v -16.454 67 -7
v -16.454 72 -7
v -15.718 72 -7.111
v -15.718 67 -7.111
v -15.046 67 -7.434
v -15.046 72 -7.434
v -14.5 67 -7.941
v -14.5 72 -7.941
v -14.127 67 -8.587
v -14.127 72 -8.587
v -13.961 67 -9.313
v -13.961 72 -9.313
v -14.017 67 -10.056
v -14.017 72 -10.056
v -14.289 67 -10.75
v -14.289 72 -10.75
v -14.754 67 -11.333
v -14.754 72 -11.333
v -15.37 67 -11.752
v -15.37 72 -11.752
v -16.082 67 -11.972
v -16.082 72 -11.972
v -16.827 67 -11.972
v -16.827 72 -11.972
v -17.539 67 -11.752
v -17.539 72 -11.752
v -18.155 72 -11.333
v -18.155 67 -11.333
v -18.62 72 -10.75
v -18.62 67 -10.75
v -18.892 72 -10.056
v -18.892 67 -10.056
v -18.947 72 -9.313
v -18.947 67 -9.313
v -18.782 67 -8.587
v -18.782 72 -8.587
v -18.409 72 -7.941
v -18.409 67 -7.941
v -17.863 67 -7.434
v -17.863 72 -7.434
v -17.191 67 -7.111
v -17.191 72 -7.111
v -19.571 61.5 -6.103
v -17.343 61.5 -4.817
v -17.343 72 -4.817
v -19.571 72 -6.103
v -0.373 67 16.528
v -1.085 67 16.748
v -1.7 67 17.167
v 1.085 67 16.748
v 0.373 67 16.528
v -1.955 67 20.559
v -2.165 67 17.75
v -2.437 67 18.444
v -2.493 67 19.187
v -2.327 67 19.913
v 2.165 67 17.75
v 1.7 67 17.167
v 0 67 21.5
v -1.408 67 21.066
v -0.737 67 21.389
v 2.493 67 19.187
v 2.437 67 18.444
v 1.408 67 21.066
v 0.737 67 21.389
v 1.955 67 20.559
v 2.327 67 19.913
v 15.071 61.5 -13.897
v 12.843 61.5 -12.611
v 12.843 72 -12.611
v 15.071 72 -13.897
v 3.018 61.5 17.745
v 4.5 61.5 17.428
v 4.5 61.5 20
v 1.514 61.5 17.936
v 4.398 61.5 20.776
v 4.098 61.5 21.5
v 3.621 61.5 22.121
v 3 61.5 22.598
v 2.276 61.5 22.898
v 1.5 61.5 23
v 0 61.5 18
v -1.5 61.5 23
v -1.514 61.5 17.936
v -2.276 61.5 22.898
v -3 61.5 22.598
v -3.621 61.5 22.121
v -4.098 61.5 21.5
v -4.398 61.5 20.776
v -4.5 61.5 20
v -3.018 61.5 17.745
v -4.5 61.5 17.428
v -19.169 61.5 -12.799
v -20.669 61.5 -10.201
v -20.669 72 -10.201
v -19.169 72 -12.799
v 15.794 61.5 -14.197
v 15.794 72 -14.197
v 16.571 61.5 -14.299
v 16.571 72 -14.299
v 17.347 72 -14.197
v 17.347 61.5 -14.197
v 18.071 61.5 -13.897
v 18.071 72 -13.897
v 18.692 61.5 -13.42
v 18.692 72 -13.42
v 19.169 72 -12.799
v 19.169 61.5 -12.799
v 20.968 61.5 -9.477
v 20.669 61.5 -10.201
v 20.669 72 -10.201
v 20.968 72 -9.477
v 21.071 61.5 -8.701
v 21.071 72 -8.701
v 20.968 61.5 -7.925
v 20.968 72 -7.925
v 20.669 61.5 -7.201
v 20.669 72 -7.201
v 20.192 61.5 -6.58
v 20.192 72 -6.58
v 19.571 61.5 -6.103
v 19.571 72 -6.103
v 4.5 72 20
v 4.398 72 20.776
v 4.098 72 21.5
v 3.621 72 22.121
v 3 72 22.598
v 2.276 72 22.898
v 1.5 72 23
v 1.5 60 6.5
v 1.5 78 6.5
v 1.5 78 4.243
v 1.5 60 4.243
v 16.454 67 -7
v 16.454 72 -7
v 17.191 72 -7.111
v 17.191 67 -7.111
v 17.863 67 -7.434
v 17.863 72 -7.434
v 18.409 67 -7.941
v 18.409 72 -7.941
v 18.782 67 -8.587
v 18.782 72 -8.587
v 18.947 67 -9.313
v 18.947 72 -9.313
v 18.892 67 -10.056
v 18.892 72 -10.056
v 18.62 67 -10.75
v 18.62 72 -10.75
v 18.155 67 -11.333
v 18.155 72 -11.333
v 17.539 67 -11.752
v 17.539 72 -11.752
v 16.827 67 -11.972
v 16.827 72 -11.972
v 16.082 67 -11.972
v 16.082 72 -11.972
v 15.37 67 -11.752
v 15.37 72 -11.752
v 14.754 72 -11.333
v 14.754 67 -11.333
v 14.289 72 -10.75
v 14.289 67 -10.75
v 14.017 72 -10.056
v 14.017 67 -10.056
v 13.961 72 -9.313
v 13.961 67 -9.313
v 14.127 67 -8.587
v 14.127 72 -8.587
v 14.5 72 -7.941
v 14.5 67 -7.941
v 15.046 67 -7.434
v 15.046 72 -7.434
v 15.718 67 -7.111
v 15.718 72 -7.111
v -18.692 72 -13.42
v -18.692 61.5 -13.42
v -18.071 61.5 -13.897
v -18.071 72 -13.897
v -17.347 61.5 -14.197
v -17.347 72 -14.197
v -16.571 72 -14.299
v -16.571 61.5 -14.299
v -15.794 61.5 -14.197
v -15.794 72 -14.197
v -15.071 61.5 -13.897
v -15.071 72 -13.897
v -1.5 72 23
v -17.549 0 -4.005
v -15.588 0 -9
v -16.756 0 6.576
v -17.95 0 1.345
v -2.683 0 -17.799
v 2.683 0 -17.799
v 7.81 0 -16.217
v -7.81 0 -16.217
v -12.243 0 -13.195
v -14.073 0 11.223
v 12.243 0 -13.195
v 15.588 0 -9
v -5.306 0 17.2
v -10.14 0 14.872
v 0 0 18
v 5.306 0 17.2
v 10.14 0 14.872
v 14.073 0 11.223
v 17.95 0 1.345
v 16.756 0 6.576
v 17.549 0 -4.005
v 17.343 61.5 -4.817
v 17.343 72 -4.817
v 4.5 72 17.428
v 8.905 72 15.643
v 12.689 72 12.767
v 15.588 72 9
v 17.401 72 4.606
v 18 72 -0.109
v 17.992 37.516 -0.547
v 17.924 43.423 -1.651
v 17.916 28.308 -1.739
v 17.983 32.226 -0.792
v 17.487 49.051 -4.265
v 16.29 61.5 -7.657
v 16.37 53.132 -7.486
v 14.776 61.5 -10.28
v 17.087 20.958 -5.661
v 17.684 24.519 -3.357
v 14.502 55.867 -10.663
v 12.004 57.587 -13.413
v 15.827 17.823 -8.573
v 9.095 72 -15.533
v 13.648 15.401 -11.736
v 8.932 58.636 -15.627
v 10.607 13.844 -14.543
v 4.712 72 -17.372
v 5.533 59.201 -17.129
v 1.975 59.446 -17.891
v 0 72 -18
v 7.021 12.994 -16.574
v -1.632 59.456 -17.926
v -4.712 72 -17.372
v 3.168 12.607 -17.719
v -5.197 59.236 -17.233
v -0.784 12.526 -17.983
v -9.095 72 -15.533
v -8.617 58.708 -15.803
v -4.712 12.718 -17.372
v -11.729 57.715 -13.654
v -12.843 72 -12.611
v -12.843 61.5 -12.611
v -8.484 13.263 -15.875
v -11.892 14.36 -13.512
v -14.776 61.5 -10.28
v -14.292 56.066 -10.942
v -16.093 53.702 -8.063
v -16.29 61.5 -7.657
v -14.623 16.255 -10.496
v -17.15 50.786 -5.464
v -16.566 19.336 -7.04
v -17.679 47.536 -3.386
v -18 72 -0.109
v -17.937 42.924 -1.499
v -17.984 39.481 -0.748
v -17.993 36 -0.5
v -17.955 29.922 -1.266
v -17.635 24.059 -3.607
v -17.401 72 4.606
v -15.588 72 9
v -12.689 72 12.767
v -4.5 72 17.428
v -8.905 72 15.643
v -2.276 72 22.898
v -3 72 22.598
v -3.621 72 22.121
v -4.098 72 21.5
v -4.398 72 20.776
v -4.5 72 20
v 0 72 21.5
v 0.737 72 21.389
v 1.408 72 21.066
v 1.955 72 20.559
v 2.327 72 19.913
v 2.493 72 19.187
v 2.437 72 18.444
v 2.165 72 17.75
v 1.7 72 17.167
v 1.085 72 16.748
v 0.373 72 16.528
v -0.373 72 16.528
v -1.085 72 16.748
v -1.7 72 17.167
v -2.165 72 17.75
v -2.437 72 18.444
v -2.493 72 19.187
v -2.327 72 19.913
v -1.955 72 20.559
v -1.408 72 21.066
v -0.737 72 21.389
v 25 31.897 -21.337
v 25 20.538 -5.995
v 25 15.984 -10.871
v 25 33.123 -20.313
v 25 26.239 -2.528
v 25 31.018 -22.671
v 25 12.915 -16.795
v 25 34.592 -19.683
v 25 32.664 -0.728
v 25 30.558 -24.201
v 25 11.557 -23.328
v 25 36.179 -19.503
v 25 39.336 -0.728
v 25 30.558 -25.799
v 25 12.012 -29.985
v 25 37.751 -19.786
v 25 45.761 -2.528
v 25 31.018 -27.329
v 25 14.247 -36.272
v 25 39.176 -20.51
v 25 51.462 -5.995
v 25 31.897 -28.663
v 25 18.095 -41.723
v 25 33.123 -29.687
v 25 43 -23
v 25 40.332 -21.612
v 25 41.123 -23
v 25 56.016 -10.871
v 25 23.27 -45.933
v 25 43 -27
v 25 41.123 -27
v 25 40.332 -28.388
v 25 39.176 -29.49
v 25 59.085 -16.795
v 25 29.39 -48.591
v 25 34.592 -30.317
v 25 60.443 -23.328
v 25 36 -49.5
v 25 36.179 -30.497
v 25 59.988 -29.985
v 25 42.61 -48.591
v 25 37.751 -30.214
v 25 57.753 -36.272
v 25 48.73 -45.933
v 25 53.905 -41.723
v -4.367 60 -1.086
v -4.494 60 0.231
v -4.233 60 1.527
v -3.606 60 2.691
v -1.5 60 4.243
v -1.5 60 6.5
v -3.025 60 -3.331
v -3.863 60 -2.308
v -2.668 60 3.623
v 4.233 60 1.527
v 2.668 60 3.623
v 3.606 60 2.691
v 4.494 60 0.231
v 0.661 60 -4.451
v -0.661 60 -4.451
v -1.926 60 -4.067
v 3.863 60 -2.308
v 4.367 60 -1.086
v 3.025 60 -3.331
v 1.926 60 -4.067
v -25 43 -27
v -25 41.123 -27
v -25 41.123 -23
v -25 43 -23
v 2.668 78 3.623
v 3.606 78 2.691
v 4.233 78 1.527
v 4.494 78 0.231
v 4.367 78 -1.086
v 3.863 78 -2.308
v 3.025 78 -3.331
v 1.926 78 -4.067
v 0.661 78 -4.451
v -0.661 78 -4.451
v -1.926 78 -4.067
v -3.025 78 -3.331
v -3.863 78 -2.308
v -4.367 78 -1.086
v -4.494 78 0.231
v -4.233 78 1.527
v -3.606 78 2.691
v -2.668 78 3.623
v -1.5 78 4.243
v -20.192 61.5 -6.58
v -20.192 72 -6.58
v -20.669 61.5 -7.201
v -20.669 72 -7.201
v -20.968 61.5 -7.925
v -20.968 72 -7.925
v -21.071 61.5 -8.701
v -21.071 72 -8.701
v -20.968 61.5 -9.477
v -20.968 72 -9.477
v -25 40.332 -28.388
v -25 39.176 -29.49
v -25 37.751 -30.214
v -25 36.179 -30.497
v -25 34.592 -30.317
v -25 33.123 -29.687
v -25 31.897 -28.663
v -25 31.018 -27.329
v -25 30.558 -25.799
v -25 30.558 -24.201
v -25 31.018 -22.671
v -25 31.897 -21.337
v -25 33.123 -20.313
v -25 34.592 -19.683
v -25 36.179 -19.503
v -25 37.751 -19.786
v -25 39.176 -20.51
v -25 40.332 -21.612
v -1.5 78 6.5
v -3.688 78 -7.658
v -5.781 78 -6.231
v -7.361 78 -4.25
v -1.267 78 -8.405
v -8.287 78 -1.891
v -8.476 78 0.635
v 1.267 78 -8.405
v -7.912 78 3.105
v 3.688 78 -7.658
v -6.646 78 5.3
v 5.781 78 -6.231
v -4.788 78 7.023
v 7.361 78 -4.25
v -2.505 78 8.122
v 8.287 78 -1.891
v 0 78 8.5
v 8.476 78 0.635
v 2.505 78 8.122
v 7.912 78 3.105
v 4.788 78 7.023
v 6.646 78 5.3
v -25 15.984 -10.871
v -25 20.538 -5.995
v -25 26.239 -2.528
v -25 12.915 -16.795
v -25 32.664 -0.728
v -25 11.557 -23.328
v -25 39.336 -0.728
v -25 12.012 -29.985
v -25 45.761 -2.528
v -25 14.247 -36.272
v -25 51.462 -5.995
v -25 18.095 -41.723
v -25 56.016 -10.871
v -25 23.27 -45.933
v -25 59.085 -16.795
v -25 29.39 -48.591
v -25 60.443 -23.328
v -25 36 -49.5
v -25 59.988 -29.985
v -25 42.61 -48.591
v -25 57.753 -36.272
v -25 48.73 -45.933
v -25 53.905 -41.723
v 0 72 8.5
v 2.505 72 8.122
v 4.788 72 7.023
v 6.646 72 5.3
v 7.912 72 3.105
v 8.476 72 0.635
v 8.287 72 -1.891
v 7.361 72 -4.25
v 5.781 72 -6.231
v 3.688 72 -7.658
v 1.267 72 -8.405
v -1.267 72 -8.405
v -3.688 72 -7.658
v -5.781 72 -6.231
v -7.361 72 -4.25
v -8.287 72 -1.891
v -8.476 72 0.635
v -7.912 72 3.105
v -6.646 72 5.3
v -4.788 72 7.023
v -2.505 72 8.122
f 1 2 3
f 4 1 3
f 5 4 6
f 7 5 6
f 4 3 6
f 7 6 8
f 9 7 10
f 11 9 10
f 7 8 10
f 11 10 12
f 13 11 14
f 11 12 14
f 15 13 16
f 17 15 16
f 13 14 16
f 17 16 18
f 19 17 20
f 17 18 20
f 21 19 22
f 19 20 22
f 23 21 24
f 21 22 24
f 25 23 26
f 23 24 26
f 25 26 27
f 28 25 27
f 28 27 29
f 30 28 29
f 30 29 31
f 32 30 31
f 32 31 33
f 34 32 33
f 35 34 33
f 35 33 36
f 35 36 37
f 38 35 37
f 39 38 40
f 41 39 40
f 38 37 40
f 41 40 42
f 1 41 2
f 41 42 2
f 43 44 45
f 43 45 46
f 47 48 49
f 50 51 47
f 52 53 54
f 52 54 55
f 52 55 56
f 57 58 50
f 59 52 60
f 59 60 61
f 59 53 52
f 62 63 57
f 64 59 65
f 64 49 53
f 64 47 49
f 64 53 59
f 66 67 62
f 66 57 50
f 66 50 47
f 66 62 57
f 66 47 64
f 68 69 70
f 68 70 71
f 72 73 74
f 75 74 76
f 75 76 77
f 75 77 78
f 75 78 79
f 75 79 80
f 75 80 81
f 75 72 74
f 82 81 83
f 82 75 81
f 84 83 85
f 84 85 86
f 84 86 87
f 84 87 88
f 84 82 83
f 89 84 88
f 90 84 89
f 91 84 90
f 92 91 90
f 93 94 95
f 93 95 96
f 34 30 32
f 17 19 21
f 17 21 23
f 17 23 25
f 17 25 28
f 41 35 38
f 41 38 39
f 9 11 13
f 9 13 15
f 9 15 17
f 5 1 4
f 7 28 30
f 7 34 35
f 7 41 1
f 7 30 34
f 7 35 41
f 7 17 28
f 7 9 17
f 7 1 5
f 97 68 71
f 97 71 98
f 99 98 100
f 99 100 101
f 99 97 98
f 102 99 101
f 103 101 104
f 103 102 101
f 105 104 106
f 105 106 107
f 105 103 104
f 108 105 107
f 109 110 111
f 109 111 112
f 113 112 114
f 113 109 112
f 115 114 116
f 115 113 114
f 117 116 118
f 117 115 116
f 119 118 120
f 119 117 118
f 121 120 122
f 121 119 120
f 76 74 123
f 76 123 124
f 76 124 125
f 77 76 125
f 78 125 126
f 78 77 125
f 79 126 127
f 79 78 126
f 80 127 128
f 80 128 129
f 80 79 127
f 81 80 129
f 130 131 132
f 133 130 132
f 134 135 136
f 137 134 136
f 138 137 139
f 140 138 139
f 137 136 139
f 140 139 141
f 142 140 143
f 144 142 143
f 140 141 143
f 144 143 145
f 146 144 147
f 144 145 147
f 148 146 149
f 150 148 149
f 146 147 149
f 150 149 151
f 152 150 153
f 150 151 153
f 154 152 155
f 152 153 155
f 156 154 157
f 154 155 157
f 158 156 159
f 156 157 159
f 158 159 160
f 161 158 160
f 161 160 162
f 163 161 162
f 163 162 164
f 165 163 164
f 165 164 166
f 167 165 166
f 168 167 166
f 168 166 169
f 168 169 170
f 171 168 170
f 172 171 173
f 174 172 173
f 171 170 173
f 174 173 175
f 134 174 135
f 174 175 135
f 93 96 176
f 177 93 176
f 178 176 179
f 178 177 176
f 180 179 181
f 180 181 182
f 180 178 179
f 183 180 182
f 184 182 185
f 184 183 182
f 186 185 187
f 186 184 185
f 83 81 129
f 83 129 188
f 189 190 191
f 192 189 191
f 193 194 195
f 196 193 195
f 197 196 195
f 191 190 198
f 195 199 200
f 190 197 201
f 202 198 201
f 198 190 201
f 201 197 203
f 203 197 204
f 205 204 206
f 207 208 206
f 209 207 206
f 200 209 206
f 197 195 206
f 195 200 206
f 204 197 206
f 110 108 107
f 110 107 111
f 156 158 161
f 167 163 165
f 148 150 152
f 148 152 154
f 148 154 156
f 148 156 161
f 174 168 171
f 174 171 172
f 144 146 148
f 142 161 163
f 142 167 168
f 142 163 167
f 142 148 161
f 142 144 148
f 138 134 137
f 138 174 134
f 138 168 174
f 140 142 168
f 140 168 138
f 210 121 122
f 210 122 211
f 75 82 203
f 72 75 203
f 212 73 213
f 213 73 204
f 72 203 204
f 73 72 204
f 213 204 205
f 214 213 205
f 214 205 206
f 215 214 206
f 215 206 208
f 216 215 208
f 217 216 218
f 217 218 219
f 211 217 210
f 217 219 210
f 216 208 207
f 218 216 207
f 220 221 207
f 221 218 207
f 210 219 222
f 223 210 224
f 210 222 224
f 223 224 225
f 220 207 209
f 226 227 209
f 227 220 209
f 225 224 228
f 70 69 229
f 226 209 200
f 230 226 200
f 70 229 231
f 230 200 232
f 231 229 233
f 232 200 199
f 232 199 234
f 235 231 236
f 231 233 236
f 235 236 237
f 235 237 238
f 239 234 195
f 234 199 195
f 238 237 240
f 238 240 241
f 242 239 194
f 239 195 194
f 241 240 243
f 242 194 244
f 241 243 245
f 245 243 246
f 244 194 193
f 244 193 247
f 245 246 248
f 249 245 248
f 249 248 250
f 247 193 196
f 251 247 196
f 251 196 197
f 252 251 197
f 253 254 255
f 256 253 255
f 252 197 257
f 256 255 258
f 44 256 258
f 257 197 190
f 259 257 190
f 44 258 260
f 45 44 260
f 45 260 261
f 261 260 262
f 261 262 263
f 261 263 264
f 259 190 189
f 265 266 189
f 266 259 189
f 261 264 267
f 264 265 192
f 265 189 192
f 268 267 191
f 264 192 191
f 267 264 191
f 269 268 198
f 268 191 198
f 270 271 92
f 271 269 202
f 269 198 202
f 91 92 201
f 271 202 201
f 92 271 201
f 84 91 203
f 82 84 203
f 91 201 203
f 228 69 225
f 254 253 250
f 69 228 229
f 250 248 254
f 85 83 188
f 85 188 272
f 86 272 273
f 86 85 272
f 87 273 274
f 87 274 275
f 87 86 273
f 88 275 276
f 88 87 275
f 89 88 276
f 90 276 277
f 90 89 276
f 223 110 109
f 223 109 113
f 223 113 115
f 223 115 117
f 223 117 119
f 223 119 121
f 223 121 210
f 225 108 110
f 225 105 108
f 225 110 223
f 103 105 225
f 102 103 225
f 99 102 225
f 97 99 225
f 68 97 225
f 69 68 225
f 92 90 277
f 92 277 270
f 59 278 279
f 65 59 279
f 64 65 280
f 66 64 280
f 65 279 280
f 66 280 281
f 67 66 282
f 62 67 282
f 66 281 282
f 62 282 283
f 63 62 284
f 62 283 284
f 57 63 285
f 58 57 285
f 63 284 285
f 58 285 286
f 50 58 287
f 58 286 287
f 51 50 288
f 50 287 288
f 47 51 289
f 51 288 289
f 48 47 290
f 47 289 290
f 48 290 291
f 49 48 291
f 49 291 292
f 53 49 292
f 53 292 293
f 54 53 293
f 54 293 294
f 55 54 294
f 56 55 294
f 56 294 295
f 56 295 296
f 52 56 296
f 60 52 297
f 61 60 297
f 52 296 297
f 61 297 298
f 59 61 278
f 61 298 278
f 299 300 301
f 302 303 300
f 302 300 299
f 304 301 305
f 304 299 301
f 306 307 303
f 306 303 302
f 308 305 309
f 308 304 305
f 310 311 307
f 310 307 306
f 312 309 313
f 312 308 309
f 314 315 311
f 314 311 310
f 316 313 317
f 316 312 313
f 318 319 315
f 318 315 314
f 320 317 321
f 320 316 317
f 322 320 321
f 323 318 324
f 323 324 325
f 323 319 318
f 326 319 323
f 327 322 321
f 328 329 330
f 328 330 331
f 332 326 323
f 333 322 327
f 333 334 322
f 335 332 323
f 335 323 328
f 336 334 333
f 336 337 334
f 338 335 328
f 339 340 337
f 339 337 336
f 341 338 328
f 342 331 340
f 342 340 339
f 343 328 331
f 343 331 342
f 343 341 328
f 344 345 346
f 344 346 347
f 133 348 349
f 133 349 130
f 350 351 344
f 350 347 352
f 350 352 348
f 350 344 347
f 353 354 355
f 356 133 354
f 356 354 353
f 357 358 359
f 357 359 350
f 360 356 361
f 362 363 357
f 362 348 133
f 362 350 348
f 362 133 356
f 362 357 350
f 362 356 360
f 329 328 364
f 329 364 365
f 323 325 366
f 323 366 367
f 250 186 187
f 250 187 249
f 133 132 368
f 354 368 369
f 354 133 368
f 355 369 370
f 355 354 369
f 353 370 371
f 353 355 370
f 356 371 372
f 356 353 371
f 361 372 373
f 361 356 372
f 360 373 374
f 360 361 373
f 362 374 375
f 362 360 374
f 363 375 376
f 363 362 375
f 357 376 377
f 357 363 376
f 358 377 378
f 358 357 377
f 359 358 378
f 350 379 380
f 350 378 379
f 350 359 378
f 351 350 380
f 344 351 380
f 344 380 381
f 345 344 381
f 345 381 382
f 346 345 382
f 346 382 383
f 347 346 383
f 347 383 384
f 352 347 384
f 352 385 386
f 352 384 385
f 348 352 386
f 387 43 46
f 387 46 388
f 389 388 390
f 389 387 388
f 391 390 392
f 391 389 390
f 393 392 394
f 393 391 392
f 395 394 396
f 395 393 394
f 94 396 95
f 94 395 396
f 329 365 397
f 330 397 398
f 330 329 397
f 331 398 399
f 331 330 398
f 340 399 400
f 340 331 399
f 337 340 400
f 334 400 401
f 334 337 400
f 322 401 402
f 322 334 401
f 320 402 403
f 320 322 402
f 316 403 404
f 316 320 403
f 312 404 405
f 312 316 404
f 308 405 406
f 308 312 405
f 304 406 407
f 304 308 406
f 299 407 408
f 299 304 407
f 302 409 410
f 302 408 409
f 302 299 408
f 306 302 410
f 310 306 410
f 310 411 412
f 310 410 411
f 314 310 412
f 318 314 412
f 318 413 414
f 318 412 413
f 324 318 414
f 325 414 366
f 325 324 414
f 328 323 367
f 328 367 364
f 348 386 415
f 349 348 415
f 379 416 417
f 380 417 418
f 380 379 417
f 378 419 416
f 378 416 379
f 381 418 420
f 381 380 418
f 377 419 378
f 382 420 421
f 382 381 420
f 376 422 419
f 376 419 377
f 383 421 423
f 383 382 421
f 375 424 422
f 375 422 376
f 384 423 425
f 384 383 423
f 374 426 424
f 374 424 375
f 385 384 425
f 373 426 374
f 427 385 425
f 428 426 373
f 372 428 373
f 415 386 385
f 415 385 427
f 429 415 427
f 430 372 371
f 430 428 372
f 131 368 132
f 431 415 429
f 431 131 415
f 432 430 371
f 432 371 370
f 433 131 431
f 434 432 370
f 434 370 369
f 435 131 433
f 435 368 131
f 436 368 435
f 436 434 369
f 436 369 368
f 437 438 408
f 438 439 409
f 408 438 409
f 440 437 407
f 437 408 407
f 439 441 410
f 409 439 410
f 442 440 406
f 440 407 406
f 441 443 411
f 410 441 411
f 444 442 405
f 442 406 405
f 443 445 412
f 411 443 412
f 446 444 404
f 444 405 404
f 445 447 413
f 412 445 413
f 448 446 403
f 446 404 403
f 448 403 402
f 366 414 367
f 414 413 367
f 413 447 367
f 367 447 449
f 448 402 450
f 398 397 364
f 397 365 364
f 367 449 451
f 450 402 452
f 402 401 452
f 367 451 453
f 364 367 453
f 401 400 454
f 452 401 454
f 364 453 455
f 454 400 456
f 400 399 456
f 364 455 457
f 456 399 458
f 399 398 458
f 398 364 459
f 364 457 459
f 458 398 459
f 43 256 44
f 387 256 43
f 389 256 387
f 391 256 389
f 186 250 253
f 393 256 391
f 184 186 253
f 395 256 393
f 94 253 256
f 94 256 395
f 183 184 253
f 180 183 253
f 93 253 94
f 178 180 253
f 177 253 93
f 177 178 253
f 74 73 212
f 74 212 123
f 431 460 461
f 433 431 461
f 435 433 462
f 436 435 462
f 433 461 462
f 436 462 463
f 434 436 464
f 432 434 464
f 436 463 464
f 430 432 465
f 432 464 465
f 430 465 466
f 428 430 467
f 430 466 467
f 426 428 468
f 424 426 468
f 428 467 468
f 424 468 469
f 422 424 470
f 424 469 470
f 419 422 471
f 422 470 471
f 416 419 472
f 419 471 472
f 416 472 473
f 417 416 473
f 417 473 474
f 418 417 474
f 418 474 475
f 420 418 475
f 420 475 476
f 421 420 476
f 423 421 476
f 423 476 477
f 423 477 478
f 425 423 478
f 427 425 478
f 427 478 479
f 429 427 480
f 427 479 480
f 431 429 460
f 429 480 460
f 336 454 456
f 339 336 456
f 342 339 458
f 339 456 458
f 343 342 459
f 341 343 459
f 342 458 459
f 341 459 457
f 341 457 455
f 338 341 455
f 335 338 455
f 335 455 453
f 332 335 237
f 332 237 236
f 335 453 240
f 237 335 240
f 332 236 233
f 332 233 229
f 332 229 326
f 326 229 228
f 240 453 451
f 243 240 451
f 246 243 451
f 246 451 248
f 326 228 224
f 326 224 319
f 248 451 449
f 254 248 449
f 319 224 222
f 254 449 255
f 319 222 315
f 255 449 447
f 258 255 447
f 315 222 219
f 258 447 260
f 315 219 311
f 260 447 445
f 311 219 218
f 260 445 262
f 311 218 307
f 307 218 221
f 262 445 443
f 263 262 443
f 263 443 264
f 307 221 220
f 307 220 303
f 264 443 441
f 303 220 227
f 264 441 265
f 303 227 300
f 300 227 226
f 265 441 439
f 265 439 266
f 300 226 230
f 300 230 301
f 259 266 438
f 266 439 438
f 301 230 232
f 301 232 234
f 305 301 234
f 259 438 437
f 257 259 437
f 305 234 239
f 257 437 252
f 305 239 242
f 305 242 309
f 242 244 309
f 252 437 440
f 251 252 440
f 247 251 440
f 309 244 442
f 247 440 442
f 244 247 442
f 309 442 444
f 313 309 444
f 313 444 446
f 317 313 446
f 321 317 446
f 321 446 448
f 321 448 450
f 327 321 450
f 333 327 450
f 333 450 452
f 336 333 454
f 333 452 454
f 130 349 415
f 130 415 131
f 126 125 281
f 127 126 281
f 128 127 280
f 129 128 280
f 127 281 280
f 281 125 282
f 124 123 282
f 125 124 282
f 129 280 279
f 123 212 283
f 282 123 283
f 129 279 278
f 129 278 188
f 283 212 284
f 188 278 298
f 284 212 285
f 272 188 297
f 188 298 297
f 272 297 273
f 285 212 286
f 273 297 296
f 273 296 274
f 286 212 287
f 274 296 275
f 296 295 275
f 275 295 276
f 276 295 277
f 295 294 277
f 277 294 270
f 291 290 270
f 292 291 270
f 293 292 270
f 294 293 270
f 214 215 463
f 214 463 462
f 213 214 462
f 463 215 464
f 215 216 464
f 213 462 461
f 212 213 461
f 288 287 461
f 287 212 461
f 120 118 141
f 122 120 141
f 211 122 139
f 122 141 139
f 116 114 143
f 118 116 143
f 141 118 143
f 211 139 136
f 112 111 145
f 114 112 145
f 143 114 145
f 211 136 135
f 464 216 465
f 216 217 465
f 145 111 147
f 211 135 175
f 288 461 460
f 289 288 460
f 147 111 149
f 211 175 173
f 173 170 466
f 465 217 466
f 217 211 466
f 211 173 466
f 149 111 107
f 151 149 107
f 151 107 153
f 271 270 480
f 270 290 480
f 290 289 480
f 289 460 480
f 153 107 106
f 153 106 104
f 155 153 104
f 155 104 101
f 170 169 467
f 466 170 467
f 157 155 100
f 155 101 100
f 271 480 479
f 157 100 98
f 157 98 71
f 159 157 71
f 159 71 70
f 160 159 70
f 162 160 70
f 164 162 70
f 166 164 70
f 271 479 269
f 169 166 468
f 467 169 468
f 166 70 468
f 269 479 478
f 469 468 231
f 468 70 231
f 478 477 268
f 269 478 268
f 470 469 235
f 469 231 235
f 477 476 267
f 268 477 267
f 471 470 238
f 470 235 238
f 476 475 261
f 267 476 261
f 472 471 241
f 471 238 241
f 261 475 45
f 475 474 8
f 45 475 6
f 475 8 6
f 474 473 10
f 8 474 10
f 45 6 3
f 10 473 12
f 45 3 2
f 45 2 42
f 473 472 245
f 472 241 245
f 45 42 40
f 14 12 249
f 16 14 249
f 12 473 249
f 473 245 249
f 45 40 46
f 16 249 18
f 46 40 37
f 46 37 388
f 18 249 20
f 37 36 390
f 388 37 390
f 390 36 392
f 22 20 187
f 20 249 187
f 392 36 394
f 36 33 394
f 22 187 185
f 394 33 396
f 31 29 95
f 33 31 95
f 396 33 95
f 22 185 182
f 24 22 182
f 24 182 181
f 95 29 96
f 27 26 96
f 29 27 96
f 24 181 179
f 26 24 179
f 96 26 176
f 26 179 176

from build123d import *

# Parameters (mm, degrees)
SKETCH_1_R               = 18
EXTRUDE_1_DEPTH          = 72
EXTRUDE_2_DEPTH          = 25
EXTRUDE_2_DEPTH_BACK     = 25
SKETCH_2_R               = 24.5
CUT_EXTRUDE_1_DEPTH      = 101.669012284
SKETCH_5_R               = 8.5
EXTRUDE_3_DEPTH          = 6
CUT_EXTRUDE_2_DEPTH      = 10
CUT_EXTRUDE_2_DEPTH_BACK = 12
EXTRUDE_START            = -10.5
EXTRUDE_4_DEPTH          = 10.5
SKETCH_7_R               = 2.5
CUT_EXTRUDE_3_DEPTH      = 5


with BuildPart() as part:
    # 草图1 → 凸台-拉伸1 (new body)
    with BuildSketch(Plane(origin=(0, 0, 0), x_dir=(1, 0, 0), z_dir=(0, 1, 0))):
        Circle(SKETCH_1_R)
    extrude(amount=EXTRUDE_1_DEPTH)

    # 草图2 → 凸台-拉伸2 (add, two sides: drawn at the far end of the back side and taken through both)
    with BuildSketch(Plane(origin=(0, 0, 0), x_dir=(0, 0, -1), z_dir=(1, 0, 0)).offset(-EXTRUDE_2_DEPTH_BACK)):
        with Locations((25, 36)):
            Circle(SKETCH_2_R)
    extrude(amount=EXTRUDE_2_DEPTH + EXTRUDE_2_DEPTH_BACK)

    # 草图3 → 切除-拉伸1 (cut, through all)
    with BuildSketch(Plane(origin=(25, 0, 0), x_dir=(0, 0, -1), z_dir=(1, 0, 0))):
        with BuildLine():
            Line((23, 41.123475383), (23, 43))
            Line((23, 43), (27, 43))
            Line((27, 43), (27, 41.123475383))
            ThreePointArc((27, 41.123475383), (25, 30.5), (23, 41.123475383))
        make_face()
    extrude(amount=-CUT_EXTRUDE_1_DEPTH, mode=Mode.SUBTRACT)

    # 草图5 → 凸台-拉伸3 (add)
    with BuildSketch(Plane(origin=(0, 72, 0), x_dir=(1, 0, 0), z_dir=(0, 1, 0))):
        Circle(SKETCH_5_R)
    extrude(amount=EXTRUDE_3_DEPTH)

    # 草图4 → 切除-拉伸2 (cut, two sides: drawn at the far end of the back side and taken through both)
    with BuildSketch(Plane(origin=(0, 72, 0), x_dir=(1, 0, 0), z_dir=(0, 1, 0)).offset(-CUT_EXTRUDE_2_DEPTH_BACK)):
        with BuildLine():
            Line((-1.5, -4.242640687), (-1.5, -6.5))
            Line((-1.5, -6.5), (1.5, -6.5))
            Line((1.5, -6.5), (1.5, -4.242640687))
            ThreePointArc((1.5, -4.242640687), (0, 4.5), (-1.5, -4.242640687))
        make_face()
    extrude(amount=CUT_EXTRUDE_2_DEPTH + CUT_EXTRUDE_2_DEPTH_BACK, mode=Mode.SUBTRACT)

    # 草图6 → 凸台-拉伸4 (add)
    with BuildSketch(Plane(origin=(0, 72, 0), x_dir=(1, 0, 0), z_dir=(0, 1, 0)).offset(EXTRUDE_START)):
        with BuildLine():
            Line((-20.668584287, 10.200961894), (-19.168584287, 12.799038106))
            ThreePointArc((-19.168584287, 12.799038106), (-17.346965211, 14.196815585), (-15.070508076, 13.897114317))
            Line((-15.070508076, 13.897114317), (-12.843458848, 12.611326846))
            ThreePointArc((-12.843458848, 12.611326846), (-15.588457268, 9), (-17.343458848, 4.817098212))
            Line((-17.343458848, 4.817098212), (-19.570508076, 6.102885683))
            ThreePointArc((-19.570508076, 6.102885683), (-20.968285555, 7.924504759), (-20.668584287, 10.200961894))
        make_face()
        with BuildLine():
            Line((1.5, -23), (-1.5, -23))
            ThreePointArc((-1.5, -23), (-3.621320344, -22.121320344), (-4.5, -20))
            Line((-4.5, -20), (-4.5, -17.428425058))
            ThreePointArc((-4.5, -17.428425058), (0, -18), (4.5, -17.428425058))
            Line((4.5, -17.428425058), (4.5, -20))
            ThreePointArc((4.5, -20), (3.621320344, -22.121320344), (1.5, -23))
        make_face()
        with BuildLine():
            Line((19.168584287, 12.799038106), (20.668584287, 10.200961894))
            ThreePointArc((20.668584287, 10.200961894), (20.968285555, 7.924504759), (19.570508076, 6.102885683))
            Line((19.570508076, 6.102885683), (17.343458848, 4.817098212))
            ThreePointArc((17.343458848, 4.817098212), (15.588457268, 9), (12.843458848, 12.611326846))
            Line((12.843458848, 12.611326846), (15.070508076, 13.897114317))
            ThreePointArc((15.070508076, 13.897114317), (17.346965211, 14.196815585), (19.168584287, 12.799038106))
        make_face()
    extrude(amount=EXTRUDE_4_DEPTH)

    # 草图7 → 切除-拉伸3 (cut)
    with BuildSketch(Plane(origin=(0, 72, 0), x_dir=(1, 0, 0), z_dir=(0, 1, 0))):
        with Locations((0, -19)):
            Circle(SKETCH_7_R)
        with Locations((16.454482672, 9.5)):
            Circle(SKETCH_7_R)
        with Locations((-16.454482672, 9.5)):
            Circle(SKETCH_7_R)
    extrude(amount=-CUT_EXTRUDE_3_DEPTH, mode=Mode.SUBTRACT)


solid = part.part
